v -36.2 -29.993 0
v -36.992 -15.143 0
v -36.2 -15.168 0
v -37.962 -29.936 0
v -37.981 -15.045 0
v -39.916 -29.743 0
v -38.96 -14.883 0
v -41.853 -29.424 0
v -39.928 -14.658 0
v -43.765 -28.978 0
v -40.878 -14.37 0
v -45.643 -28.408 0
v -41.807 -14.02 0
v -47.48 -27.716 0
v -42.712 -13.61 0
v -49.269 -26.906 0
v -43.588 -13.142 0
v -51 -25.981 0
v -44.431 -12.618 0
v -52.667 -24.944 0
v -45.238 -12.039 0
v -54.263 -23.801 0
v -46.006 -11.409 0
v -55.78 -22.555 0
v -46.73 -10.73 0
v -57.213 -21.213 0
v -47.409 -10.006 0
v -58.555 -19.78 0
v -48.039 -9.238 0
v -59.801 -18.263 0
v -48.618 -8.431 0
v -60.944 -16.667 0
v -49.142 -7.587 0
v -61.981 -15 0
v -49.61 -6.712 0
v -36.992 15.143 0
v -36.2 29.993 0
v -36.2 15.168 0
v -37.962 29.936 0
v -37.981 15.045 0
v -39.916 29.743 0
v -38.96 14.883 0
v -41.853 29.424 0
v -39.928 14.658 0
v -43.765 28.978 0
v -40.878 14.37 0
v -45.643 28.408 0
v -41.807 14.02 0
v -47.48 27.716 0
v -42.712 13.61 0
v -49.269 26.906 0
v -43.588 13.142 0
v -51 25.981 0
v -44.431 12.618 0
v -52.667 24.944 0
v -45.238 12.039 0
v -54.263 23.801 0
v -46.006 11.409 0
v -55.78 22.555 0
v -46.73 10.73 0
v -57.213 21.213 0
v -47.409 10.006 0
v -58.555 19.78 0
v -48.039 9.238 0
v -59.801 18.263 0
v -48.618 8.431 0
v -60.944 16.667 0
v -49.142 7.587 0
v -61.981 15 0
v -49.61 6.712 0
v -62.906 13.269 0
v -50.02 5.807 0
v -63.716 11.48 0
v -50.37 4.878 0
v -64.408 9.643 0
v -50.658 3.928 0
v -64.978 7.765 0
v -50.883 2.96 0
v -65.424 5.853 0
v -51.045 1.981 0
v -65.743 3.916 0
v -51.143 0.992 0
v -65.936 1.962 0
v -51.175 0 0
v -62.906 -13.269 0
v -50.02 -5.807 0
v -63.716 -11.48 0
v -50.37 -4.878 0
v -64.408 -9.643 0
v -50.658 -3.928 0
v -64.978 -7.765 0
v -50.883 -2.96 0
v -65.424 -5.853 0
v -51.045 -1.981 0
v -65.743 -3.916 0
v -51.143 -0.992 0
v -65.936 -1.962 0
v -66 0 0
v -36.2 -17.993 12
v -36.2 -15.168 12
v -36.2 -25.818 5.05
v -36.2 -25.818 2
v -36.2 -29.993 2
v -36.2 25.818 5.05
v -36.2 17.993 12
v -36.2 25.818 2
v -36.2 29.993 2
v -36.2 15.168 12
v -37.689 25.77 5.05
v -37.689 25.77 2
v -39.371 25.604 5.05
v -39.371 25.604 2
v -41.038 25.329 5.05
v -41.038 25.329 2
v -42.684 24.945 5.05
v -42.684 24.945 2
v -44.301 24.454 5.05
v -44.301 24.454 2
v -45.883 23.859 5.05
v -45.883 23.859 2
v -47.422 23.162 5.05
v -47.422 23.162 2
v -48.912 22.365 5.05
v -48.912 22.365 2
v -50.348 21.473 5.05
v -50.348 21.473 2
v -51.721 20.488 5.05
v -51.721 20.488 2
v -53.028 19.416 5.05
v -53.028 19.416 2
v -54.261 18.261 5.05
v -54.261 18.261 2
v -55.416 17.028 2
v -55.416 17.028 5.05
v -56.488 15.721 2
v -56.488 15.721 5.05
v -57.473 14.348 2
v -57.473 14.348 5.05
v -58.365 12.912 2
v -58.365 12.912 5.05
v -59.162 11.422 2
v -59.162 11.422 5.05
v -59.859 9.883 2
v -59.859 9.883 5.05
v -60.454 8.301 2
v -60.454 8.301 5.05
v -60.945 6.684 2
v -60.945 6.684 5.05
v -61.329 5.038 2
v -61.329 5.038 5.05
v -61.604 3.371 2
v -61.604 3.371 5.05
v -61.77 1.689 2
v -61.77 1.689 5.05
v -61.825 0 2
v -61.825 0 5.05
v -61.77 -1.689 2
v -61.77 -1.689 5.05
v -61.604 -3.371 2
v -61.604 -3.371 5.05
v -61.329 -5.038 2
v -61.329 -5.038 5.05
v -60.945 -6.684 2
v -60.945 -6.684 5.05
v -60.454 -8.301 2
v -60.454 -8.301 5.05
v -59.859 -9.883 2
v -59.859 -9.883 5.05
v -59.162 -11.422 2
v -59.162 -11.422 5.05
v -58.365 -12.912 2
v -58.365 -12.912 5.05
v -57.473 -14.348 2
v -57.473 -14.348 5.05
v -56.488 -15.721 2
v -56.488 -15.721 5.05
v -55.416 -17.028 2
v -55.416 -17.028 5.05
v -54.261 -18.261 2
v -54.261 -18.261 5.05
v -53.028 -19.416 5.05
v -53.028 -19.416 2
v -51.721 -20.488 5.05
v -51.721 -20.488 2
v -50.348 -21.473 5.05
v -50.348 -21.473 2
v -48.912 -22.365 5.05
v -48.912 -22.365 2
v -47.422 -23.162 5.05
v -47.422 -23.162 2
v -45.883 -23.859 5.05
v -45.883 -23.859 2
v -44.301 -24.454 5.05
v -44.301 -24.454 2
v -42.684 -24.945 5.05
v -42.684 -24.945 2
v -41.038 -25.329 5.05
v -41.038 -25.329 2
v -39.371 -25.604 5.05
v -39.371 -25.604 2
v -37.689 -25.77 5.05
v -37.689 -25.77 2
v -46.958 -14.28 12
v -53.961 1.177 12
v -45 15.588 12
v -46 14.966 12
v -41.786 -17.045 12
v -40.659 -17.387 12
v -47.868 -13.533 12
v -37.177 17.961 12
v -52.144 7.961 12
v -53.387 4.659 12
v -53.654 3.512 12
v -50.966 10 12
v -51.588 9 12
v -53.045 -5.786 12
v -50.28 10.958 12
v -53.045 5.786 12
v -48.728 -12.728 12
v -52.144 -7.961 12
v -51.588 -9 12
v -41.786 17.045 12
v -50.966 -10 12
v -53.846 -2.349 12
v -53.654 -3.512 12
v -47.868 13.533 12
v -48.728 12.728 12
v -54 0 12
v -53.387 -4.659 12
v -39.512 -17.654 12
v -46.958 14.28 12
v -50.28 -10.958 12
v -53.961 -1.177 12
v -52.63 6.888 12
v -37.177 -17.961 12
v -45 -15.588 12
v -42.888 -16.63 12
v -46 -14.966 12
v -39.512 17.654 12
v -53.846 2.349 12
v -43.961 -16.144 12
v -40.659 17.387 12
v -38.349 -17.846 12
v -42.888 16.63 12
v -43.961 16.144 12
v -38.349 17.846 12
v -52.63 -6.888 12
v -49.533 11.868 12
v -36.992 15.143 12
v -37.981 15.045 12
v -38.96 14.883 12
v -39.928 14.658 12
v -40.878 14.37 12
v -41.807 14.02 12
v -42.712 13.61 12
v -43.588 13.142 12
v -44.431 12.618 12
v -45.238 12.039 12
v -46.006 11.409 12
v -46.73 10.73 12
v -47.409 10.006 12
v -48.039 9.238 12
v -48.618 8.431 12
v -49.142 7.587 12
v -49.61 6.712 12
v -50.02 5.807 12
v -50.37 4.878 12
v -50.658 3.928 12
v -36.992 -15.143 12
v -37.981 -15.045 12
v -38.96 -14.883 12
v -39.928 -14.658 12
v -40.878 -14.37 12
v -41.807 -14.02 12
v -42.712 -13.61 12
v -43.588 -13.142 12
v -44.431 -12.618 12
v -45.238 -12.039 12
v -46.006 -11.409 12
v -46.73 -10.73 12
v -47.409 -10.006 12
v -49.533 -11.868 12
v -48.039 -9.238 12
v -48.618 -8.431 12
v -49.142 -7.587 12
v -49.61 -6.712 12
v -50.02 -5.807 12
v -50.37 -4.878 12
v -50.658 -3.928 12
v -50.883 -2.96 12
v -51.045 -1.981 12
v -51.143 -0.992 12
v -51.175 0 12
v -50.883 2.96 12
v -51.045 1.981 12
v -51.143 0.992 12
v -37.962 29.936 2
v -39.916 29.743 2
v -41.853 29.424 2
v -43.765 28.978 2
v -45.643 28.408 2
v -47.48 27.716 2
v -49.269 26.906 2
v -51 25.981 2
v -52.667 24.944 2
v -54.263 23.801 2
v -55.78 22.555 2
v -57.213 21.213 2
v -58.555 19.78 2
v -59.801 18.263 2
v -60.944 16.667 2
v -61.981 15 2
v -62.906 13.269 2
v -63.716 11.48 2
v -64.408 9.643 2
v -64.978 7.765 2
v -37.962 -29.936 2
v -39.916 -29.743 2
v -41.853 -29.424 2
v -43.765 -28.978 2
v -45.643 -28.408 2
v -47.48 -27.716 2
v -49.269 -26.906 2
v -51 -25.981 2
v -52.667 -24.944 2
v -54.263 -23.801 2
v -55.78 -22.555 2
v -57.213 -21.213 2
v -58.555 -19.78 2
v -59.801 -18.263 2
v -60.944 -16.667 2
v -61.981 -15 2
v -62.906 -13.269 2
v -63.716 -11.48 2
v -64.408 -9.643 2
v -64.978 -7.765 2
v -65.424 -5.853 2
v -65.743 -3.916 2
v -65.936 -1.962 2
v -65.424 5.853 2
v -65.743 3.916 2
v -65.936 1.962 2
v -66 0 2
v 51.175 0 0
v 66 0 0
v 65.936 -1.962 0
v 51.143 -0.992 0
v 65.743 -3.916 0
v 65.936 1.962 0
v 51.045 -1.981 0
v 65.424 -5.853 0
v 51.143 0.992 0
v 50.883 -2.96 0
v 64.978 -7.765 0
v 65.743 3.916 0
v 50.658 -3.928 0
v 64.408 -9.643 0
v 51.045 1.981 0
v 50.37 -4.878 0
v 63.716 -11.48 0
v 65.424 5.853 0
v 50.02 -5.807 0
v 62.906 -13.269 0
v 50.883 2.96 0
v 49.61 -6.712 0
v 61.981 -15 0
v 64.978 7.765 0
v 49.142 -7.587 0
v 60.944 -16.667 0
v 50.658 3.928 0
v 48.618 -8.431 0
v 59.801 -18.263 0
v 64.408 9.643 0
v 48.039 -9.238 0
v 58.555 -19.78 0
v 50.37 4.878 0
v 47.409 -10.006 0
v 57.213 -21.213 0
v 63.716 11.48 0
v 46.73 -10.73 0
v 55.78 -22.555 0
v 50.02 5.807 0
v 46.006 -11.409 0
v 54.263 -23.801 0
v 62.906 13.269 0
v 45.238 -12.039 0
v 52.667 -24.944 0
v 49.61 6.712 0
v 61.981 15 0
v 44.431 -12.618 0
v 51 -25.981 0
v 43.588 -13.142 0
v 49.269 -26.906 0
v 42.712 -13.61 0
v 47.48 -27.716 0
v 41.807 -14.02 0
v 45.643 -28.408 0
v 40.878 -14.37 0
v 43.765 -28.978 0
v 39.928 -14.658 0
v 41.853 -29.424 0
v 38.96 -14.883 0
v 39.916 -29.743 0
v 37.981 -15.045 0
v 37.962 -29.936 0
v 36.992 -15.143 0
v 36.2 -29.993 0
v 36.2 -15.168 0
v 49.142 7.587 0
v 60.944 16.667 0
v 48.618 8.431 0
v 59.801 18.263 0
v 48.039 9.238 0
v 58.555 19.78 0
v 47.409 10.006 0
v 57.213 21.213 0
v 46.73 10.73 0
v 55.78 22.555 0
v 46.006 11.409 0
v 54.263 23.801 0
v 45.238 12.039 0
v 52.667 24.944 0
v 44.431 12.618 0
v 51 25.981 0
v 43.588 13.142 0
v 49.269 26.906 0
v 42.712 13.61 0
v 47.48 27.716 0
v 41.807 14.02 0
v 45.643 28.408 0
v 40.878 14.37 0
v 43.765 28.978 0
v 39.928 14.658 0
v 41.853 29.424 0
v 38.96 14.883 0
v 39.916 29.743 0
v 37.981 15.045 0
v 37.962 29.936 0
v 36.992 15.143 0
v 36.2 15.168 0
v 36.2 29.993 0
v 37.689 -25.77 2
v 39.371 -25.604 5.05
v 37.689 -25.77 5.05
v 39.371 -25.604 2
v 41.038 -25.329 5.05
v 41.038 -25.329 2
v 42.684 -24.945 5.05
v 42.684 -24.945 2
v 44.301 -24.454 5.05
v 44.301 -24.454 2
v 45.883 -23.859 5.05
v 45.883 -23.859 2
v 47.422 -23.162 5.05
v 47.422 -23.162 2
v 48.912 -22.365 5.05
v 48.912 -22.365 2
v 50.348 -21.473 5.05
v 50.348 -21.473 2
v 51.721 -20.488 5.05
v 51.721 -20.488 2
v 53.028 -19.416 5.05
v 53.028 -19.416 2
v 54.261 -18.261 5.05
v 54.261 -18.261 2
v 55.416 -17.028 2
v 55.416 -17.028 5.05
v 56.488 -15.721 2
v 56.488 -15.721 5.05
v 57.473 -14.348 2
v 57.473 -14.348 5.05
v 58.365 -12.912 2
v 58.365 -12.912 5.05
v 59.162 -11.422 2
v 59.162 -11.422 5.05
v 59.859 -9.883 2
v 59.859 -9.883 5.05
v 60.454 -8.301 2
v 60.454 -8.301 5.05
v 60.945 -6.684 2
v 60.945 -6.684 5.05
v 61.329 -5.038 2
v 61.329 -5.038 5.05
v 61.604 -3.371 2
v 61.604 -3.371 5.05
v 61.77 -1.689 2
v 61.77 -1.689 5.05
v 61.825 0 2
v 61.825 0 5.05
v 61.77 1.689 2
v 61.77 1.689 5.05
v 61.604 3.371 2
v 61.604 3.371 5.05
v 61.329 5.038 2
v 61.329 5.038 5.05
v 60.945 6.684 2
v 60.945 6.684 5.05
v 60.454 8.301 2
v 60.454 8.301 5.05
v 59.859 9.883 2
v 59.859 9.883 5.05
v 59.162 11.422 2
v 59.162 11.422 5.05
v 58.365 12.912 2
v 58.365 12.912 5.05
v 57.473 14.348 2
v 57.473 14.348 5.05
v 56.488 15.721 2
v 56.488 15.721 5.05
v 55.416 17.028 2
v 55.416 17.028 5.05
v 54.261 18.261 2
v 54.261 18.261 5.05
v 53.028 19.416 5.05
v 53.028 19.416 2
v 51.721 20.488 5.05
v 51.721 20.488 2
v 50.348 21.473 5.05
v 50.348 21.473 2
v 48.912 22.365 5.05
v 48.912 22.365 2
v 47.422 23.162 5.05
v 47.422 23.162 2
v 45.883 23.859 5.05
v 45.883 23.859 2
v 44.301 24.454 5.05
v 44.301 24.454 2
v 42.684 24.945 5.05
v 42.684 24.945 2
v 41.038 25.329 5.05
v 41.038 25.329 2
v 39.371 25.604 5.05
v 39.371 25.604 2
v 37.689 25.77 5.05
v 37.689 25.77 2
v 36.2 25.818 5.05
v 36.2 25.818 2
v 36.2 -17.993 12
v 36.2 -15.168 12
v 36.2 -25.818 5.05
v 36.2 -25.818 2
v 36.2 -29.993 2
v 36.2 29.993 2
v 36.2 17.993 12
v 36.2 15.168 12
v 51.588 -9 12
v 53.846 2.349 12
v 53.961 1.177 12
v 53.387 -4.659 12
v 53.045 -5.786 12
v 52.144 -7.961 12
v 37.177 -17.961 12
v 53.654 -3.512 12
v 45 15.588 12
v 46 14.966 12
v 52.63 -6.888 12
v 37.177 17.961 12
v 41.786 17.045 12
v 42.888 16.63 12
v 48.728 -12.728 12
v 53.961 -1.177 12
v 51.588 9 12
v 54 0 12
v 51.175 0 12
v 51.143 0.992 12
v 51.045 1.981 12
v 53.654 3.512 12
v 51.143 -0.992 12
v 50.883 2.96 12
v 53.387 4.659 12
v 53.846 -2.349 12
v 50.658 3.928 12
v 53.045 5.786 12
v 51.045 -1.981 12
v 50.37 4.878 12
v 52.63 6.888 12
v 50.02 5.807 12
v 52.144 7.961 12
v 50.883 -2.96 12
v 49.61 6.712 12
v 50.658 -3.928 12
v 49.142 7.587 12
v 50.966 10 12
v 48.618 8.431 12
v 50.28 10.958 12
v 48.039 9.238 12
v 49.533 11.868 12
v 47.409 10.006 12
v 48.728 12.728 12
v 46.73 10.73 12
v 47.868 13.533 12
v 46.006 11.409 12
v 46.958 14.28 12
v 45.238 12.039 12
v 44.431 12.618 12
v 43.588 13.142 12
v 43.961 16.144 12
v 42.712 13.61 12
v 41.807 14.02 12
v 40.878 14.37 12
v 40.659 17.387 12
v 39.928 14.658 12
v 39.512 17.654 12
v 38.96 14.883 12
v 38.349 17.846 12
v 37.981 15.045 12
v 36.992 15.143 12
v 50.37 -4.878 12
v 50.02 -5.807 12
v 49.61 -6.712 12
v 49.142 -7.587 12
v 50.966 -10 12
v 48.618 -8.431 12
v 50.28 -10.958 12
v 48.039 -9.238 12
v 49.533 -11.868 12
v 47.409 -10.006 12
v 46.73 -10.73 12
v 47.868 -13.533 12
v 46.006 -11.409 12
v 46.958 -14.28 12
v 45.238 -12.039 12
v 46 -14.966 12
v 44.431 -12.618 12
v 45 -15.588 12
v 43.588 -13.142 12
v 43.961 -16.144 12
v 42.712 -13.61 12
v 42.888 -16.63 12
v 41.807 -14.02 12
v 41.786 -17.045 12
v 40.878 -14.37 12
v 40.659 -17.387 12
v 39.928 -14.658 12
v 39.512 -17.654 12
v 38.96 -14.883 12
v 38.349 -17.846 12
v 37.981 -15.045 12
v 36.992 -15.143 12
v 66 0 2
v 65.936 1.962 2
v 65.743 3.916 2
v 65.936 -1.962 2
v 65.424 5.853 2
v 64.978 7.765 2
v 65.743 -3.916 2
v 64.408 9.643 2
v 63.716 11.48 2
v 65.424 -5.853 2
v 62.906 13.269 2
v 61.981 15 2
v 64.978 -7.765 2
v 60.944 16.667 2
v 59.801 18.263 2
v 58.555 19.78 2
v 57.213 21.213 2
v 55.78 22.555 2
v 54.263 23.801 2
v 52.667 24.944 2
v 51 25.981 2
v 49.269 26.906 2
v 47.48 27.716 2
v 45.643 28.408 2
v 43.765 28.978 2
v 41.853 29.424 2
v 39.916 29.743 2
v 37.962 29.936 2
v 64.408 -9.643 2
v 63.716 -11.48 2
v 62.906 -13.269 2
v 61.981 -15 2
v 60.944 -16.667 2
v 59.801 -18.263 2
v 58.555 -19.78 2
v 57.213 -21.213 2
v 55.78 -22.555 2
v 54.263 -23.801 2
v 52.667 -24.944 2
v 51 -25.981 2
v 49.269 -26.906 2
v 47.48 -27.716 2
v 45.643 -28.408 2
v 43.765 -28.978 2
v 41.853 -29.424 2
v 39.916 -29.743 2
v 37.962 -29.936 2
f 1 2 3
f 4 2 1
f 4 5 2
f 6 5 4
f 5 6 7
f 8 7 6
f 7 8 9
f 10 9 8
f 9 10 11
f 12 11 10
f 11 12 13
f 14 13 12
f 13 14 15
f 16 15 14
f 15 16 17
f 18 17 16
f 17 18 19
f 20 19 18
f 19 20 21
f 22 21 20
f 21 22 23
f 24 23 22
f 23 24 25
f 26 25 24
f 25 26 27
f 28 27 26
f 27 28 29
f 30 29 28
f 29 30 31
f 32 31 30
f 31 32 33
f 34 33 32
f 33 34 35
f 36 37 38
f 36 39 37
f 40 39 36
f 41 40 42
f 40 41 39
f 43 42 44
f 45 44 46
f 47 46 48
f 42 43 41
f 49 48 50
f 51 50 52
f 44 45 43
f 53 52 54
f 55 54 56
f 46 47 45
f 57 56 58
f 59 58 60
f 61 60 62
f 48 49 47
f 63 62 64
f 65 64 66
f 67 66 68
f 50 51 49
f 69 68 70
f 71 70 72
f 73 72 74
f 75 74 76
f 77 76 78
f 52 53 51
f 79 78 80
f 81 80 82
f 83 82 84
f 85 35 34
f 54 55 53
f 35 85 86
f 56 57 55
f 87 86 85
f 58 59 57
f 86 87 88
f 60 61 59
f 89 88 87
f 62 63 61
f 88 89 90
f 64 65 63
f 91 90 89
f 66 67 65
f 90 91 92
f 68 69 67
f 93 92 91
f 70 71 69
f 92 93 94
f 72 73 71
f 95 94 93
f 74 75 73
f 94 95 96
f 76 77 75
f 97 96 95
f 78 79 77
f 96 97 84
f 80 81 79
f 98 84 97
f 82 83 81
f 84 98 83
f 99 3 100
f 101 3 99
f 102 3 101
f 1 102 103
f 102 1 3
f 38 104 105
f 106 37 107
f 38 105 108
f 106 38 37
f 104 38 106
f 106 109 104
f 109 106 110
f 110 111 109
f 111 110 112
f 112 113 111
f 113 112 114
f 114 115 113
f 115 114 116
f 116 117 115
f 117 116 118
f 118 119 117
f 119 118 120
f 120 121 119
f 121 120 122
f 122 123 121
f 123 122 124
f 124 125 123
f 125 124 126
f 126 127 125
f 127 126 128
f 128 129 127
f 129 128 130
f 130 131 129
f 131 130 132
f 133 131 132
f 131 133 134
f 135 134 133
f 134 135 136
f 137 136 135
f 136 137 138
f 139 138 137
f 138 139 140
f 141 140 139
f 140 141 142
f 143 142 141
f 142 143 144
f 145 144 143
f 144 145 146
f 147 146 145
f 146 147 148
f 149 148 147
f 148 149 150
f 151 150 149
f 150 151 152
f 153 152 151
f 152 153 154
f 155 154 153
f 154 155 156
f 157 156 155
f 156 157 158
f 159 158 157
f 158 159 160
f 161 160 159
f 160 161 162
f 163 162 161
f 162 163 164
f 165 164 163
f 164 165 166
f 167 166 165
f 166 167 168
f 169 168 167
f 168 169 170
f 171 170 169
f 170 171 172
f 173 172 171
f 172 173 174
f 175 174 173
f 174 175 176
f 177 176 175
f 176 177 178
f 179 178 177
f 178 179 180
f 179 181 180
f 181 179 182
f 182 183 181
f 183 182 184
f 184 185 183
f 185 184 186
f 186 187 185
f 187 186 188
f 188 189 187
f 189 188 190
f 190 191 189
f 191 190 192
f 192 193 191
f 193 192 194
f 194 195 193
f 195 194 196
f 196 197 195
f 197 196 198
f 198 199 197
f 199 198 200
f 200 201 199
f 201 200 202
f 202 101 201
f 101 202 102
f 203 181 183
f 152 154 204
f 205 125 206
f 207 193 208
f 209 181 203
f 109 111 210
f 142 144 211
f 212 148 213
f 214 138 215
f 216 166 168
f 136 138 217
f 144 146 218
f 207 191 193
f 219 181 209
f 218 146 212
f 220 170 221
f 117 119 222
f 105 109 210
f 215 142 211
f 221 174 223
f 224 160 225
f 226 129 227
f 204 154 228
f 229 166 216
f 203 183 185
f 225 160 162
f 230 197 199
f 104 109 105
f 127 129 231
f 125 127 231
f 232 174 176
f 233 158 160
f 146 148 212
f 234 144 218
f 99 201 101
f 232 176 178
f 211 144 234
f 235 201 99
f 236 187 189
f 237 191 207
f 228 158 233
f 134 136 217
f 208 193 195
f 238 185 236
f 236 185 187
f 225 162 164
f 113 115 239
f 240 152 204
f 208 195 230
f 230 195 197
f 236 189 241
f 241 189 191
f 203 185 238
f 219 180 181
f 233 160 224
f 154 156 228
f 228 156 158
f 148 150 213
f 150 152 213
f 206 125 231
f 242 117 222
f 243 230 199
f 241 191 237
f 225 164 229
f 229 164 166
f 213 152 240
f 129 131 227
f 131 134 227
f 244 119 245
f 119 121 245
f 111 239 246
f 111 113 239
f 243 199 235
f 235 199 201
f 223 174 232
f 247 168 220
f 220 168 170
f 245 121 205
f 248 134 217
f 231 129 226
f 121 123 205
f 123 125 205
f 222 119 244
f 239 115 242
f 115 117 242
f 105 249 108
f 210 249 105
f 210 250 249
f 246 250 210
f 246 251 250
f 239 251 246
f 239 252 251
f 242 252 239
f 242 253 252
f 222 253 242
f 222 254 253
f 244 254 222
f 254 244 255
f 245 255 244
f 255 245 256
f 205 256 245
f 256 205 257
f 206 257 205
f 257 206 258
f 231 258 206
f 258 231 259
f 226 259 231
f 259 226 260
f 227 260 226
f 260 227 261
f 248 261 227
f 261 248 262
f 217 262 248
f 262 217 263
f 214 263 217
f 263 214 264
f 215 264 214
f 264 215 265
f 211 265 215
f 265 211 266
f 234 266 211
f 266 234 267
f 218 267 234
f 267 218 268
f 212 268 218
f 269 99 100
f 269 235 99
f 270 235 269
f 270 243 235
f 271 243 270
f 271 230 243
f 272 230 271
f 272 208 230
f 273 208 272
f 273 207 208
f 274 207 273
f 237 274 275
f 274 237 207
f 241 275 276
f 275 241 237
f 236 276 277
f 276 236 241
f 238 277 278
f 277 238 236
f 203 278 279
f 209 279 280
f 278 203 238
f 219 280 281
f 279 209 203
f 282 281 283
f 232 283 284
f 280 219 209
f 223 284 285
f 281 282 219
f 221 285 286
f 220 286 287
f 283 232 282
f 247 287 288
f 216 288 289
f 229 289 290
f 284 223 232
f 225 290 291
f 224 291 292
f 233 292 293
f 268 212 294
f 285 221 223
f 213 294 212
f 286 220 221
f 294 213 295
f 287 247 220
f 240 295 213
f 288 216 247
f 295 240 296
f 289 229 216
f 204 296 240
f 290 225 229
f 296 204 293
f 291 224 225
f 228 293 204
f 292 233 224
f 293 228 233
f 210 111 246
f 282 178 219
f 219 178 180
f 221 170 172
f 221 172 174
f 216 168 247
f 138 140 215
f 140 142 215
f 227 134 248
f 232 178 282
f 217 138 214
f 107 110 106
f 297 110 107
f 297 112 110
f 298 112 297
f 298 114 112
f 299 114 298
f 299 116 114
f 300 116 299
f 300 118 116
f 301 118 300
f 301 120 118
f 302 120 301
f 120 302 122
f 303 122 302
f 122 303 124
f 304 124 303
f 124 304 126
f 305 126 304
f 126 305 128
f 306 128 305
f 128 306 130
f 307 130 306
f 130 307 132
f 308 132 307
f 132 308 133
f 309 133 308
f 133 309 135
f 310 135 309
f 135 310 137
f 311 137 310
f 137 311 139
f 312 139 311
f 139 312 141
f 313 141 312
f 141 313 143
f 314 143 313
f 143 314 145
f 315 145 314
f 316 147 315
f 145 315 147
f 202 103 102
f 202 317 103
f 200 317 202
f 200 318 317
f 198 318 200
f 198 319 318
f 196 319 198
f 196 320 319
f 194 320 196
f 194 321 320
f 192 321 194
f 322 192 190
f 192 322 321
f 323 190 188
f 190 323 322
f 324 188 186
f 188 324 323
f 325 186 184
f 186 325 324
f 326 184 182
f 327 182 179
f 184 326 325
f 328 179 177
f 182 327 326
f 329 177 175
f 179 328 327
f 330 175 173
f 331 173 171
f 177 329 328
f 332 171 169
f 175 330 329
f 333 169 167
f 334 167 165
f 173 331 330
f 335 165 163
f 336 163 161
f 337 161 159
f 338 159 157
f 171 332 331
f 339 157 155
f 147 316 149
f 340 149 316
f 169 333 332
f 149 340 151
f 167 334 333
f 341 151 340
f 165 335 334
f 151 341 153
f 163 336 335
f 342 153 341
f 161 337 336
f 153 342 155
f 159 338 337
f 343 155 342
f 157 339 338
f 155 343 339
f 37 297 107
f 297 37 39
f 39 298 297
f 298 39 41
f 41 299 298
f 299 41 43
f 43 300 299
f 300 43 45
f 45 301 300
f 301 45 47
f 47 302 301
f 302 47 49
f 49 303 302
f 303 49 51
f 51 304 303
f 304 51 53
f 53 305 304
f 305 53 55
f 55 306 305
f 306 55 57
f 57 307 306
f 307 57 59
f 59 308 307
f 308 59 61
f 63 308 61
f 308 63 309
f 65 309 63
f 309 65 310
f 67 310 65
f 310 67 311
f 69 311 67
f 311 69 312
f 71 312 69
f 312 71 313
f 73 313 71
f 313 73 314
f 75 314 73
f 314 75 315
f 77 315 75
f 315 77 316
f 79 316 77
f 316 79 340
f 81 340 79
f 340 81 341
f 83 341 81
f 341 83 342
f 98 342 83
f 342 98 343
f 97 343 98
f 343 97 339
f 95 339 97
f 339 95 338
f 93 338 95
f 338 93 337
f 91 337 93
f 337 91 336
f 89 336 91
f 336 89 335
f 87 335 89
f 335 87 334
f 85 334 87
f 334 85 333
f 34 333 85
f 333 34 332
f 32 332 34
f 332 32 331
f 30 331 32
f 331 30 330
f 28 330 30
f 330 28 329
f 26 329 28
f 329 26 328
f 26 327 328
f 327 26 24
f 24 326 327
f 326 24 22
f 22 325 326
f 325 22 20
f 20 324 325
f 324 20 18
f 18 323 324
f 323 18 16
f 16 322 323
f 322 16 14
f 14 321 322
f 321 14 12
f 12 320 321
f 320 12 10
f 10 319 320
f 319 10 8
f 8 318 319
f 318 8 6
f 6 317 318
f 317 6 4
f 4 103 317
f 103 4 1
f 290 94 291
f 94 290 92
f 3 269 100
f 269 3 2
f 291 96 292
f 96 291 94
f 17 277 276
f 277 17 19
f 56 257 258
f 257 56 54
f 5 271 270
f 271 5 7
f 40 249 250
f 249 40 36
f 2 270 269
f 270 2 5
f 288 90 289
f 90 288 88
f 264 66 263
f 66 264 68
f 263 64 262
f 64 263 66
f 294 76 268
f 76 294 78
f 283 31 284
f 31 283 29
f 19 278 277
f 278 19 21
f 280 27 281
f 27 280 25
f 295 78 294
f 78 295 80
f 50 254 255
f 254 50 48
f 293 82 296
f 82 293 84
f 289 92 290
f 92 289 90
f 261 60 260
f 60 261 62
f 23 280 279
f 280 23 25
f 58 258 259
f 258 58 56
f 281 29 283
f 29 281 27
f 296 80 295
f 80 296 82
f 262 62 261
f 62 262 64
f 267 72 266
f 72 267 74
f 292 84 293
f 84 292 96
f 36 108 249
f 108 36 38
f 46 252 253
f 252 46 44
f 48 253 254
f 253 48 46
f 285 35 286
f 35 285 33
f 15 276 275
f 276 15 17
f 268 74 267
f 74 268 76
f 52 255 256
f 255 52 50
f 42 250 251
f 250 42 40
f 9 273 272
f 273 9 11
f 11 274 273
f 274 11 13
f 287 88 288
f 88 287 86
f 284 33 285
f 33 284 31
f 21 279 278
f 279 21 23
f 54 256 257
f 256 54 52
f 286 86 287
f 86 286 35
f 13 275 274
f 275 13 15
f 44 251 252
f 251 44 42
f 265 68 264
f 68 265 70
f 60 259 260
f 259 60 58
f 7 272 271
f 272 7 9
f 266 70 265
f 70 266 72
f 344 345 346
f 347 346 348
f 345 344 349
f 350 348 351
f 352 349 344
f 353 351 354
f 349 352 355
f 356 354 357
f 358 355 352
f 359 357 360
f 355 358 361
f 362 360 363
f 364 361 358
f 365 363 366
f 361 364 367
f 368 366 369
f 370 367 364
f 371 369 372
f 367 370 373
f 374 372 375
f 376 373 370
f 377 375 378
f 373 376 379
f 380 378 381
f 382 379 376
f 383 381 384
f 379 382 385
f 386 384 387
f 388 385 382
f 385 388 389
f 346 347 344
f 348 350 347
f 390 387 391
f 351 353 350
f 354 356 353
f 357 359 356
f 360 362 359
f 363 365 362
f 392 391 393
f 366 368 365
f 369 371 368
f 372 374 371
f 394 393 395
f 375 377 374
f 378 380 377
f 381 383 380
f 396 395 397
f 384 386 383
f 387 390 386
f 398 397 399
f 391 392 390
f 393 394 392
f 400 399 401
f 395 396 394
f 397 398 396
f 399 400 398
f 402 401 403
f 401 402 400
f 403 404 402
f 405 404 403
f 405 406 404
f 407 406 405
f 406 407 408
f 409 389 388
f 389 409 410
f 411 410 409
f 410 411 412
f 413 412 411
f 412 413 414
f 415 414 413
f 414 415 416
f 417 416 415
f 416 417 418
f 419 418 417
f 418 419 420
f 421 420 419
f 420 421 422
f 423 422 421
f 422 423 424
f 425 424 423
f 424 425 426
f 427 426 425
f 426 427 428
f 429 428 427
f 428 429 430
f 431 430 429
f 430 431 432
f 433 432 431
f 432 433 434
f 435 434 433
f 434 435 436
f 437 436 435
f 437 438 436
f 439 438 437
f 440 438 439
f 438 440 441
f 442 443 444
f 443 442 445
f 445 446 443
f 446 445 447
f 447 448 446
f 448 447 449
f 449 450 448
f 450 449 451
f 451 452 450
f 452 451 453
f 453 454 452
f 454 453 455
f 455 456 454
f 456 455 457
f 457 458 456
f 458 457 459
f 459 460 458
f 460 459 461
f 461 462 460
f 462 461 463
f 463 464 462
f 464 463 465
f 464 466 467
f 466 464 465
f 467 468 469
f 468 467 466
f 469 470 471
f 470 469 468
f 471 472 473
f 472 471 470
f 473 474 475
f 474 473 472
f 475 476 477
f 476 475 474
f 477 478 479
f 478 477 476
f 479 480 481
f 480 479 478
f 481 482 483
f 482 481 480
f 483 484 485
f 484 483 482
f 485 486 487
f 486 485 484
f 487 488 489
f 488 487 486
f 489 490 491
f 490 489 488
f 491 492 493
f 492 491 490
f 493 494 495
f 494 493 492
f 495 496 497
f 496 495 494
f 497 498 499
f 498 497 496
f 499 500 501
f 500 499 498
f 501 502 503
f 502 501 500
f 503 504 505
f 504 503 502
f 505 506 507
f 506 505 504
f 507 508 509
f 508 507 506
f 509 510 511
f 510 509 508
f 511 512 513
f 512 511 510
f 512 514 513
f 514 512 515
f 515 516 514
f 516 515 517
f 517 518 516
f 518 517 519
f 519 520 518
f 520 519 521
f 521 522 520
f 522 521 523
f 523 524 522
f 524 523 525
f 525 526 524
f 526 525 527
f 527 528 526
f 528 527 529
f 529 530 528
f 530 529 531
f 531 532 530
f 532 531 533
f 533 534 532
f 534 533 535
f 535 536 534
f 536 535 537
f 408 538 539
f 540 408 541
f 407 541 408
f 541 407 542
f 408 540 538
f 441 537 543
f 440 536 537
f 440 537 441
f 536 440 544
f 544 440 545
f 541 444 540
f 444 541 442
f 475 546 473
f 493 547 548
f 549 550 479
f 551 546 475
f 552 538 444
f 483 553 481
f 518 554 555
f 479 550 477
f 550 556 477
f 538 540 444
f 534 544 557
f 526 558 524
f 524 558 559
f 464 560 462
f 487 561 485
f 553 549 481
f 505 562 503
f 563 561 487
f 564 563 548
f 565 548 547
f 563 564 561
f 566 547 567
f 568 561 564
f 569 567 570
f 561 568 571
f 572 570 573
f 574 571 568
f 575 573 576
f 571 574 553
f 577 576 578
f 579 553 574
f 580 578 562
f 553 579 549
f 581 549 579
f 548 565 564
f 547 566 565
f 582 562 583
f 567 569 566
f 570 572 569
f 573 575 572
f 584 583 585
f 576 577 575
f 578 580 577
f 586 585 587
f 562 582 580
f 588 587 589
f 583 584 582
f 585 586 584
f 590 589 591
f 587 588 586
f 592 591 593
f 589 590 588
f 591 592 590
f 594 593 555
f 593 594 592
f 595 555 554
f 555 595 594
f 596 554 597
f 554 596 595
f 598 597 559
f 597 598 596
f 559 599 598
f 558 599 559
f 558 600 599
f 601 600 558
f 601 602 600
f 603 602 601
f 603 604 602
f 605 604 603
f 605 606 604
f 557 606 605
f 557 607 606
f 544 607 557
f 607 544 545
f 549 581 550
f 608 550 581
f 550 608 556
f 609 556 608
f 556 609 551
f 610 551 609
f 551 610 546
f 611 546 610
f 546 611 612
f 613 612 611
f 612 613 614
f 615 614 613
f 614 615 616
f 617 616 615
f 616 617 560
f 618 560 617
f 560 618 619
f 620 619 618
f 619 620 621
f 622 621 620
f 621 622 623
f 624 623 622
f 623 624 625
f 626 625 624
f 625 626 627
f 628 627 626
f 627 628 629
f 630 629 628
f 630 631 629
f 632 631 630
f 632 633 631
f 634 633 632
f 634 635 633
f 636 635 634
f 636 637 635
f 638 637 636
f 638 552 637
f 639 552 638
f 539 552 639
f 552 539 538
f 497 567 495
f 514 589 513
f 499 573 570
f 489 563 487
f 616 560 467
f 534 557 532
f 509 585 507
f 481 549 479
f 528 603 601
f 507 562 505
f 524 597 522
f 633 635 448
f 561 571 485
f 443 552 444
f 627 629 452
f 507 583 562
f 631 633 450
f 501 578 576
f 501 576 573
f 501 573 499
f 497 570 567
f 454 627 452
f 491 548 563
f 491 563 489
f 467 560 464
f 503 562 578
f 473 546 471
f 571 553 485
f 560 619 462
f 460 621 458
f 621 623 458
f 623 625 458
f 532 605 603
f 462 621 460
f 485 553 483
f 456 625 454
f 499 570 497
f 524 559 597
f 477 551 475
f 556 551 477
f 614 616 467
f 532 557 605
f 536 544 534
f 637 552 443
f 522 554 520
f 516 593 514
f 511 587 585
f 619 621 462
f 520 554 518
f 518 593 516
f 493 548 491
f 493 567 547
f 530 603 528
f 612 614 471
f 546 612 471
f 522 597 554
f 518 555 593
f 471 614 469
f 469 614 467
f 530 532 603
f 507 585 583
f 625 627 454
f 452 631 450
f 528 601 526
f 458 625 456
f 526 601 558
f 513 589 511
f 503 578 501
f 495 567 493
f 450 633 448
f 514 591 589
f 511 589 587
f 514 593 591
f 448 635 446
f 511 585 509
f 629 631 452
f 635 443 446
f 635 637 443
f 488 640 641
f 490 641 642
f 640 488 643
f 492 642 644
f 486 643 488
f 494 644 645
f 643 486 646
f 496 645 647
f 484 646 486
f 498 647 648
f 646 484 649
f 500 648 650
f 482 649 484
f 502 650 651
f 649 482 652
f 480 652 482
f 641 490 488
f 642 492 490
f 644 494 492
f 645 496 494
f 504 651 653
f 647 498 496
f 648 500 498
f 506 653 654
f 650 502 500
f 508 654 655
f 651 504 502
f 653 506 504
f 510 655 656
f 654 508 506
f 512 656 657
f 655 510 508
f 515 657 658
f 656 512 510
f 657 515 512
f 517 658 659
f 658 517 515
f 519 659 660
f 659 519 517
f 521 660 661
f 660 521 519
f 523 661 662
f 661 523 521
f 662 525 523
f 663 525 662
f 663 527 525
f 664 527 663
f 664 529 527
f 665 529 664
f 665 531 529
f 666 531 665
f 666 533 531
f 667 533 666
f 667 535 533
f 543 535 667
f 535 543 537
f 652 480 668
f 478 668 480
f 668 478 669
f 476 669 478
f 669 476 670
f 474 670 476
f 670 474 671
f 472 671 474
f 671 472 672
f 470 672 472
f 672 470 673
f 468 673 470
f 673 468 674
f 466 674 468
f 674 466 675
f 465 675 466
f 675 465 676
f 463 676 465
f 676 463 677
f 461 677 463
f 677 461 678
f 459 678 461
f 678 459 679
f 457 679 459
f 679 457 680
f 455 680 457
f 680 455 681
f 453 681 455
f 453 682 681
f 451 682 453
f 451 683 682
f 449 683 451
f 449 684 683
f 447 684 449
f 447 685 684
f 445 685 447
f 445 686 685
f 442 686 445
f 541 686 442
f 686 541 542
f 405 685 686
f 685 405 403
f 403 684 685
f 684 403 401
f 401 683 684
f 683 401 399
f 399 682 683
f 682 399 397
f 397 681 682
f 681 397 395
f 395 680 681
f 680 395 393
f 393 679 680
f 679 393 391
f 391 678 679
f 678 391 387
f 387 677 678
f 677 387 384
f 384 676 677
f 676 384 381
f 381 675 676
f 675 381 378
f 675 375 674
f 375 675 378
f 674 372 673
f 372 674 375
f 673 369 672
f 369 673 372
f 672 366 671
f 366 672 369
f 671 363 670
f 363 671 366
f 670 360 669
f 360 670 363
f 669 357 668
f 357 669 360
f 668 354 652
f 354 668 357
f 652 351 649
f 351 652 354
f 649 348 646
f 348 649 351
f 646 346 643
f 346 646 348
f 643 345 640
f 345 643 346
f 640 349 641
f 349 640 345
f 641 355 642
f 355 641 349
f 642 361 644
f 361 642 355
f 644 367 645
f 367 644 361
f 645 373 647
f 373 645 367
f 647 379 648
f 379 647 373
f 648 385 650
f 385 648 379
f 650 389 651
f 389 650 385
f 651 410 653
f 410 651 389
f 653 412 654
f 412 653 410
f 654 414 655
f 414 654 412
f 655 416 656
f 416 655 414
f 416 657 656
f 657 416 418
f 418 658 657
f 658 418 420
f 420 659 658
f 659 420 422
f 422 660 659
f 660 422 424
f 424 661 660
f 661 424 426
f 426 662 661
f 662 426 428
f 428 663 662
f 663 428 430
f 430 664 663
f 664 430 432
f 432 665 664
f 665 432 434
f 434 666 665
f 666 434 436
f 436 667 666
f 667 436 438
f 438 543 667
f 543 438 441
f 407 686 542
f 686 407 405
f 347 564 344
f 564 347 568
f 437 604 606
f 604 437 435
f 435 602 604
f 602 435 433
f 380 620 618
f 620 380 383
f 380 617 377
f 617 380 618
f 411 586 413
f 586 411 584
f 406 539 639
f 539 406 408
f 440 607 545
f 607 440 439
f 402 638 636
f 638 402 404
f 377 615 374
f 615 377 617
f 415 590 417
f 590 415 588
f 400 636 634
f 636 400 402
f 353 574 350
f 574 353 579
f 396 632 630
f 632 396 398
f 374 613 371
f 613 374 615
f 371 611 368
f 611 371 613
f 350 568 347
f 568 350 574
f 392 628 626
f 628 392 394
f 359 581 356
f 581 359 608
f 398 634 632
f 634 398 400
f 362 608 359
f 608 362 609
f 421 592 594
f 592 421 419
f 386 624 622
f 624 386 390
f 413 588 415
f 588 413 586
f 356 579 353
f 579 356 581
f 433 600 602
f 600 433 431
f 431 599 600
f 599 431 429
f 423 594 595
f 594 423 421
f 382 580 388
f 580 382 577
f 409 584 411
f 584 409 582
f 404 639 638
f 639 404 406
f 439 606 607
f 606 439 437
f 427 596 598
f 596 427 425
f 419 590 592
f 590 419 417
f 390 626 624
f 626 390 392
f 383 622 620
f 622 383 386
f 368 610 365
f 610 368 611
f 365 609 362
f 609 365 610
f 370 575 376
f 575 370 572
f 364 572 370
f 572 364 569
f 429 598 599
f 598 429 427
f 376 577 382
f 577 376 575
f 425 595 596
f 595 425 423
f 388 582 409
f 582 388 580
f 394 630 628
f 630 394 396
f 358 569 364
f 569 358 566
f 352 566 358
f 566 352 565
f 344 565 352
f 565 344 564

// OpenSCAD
// Parametric two-piece filament spool adapter V2.
// Dimensions are in millimeters.
//
// V2 default values match the existing CR-6 STL intent:
// - 30 mm printer shaft
// - 52 mm spool bore
// - 60 mm keeper/flange supported against the spool side
//
// Render both printable halves side-by-side, then put the halves together
// around the shaft to adapt the shaft diameter up to the spool bore.

$fn = 96;

shaft_diameter = 30;
spool_bore_diameter = 52;
keeper_outer_diameter = 60;

adapter_width = 12;        // Total axial width of each half.
keeper_width = 2;          // Axial thickness of the side keeper/flange.
spool_seat_width = 5;      // Straight section that seats in the spool bore.
taper_end_diameter = 36;   // Outside diameter at the shaft-side end of taper.
clearance = 0.35;          // Added to the shaft bore and removed from the spool fit.
split_gap = 0.4;           // Clearance between the two assembled half faces.
print_gap = 12;            // Gap between the two halves in the rendered layout.

// Small flat pads at the split line help the halves sit cleanly together and
// make the geometry more robust when printed.
split_flat_width = 1.2;

module half_annulus_2d(outer_diameter, inner_diameter, side = 1) {
    radius = outer_diameter / 2;

    difference() {
        intersection() {
            circle(d = outer_diameter);

            // Keep only one side of the circular adapter.  The extra overlap
            // avoids coincident edges at the split line.
            translate([
                side > 0 ? split_gap / 2 : -radius - 1,
                -radius - 1
            ])
                square([radius + 1 - split_gap / 2, outer_diameter + 2]);
        }

        circle(d = inner_diameter);

        // Trim a narrow strip from the split face so the two halves do not bind
        // when they are clamped around the shaft.
        translate([
            side > 0 ? -split_flat_width : -split_gap / 2,
            -radius - 1
        ])
            square([split_flat_width + split_gap / 2, outer_diameter + 2]);
    }
}

module tapered_half_annulus(
    start_outer_diameter,
    end_outer_diameter,
    inner_diameter,
    height,
    side = 1
) {
    // Hull two very thin half-annulus slices to create a conical taper.  The
    // bore stays constant for the shaft while the outside shrinks from the
    // spool seat toward the smaller shaft-side end.
    slice_height = 0.05;

    if (height > 0) {
        hull() {
            linear_extrude(height = slice_height)
                half_annulus_2d(start_outer_diameter, inner_diameter, side);

            translate([0, 0, height - slice_height])
                linear_extrude(height = slice_height)
                    half_annulus_2d(end_outer_diameter, inner_diameter, side);
        }
    }
}

module adapter_half(side = 1) {
    shaft_bore = shaft_diameter + clearance;
    spool_fit = spool_bore_diameter - clearance;
    taper_end = max(taper_end_diameter, shaft_bore + 2);
    seat_width = min(spool_seat_width, adapter_width);
    taper_width = adapter_width - seat_width;

    difference() {
        union() {
            // Straight spool seat at the keeper side.
            linear_extrude(height = seat_width)
                half_annulus_2d(spool_fit, shaft_bore, side);

            // Taper from the spool seat back toward the smaller shaft-side end.
            translate([0, 0, seat_width])
                tapered_half_annulus(
                    spool_fit,
                    taper_end,
                    shaft_bore,
                    taper_width,
                    side
                );

            // Larger side keeper/flange.  This is intentionally only on one side
            // so it bears on the side of the spool instead of widening the whole
            // adapter.
            linear_extrude(height = keeper_width)
                half_annulus_2d(keeper_outer_diameter, shaft_bore, side);
        }

        // The hull used for the taper can bridge across the center bore.
        // Subtract the shaft bore through the finished half as a final step so
        // the 30 mm shaft hole always passes through the entire adapter width.
        translate([0, 0, -0.1])
            linear_extrude(height = adapter_width + 0.2)
                circle(d = shaft_bore);
    }
}

module printable_pair() {
    part_offset = keeper_outer_diameter / 2 + print_gap / 2;

    translate([-part_offset, 0, 0])
        adapter_half(side = -1);

    translate([part_offset, 0, 0])
        adapter_half(side = 1);
}

printable_pair();
